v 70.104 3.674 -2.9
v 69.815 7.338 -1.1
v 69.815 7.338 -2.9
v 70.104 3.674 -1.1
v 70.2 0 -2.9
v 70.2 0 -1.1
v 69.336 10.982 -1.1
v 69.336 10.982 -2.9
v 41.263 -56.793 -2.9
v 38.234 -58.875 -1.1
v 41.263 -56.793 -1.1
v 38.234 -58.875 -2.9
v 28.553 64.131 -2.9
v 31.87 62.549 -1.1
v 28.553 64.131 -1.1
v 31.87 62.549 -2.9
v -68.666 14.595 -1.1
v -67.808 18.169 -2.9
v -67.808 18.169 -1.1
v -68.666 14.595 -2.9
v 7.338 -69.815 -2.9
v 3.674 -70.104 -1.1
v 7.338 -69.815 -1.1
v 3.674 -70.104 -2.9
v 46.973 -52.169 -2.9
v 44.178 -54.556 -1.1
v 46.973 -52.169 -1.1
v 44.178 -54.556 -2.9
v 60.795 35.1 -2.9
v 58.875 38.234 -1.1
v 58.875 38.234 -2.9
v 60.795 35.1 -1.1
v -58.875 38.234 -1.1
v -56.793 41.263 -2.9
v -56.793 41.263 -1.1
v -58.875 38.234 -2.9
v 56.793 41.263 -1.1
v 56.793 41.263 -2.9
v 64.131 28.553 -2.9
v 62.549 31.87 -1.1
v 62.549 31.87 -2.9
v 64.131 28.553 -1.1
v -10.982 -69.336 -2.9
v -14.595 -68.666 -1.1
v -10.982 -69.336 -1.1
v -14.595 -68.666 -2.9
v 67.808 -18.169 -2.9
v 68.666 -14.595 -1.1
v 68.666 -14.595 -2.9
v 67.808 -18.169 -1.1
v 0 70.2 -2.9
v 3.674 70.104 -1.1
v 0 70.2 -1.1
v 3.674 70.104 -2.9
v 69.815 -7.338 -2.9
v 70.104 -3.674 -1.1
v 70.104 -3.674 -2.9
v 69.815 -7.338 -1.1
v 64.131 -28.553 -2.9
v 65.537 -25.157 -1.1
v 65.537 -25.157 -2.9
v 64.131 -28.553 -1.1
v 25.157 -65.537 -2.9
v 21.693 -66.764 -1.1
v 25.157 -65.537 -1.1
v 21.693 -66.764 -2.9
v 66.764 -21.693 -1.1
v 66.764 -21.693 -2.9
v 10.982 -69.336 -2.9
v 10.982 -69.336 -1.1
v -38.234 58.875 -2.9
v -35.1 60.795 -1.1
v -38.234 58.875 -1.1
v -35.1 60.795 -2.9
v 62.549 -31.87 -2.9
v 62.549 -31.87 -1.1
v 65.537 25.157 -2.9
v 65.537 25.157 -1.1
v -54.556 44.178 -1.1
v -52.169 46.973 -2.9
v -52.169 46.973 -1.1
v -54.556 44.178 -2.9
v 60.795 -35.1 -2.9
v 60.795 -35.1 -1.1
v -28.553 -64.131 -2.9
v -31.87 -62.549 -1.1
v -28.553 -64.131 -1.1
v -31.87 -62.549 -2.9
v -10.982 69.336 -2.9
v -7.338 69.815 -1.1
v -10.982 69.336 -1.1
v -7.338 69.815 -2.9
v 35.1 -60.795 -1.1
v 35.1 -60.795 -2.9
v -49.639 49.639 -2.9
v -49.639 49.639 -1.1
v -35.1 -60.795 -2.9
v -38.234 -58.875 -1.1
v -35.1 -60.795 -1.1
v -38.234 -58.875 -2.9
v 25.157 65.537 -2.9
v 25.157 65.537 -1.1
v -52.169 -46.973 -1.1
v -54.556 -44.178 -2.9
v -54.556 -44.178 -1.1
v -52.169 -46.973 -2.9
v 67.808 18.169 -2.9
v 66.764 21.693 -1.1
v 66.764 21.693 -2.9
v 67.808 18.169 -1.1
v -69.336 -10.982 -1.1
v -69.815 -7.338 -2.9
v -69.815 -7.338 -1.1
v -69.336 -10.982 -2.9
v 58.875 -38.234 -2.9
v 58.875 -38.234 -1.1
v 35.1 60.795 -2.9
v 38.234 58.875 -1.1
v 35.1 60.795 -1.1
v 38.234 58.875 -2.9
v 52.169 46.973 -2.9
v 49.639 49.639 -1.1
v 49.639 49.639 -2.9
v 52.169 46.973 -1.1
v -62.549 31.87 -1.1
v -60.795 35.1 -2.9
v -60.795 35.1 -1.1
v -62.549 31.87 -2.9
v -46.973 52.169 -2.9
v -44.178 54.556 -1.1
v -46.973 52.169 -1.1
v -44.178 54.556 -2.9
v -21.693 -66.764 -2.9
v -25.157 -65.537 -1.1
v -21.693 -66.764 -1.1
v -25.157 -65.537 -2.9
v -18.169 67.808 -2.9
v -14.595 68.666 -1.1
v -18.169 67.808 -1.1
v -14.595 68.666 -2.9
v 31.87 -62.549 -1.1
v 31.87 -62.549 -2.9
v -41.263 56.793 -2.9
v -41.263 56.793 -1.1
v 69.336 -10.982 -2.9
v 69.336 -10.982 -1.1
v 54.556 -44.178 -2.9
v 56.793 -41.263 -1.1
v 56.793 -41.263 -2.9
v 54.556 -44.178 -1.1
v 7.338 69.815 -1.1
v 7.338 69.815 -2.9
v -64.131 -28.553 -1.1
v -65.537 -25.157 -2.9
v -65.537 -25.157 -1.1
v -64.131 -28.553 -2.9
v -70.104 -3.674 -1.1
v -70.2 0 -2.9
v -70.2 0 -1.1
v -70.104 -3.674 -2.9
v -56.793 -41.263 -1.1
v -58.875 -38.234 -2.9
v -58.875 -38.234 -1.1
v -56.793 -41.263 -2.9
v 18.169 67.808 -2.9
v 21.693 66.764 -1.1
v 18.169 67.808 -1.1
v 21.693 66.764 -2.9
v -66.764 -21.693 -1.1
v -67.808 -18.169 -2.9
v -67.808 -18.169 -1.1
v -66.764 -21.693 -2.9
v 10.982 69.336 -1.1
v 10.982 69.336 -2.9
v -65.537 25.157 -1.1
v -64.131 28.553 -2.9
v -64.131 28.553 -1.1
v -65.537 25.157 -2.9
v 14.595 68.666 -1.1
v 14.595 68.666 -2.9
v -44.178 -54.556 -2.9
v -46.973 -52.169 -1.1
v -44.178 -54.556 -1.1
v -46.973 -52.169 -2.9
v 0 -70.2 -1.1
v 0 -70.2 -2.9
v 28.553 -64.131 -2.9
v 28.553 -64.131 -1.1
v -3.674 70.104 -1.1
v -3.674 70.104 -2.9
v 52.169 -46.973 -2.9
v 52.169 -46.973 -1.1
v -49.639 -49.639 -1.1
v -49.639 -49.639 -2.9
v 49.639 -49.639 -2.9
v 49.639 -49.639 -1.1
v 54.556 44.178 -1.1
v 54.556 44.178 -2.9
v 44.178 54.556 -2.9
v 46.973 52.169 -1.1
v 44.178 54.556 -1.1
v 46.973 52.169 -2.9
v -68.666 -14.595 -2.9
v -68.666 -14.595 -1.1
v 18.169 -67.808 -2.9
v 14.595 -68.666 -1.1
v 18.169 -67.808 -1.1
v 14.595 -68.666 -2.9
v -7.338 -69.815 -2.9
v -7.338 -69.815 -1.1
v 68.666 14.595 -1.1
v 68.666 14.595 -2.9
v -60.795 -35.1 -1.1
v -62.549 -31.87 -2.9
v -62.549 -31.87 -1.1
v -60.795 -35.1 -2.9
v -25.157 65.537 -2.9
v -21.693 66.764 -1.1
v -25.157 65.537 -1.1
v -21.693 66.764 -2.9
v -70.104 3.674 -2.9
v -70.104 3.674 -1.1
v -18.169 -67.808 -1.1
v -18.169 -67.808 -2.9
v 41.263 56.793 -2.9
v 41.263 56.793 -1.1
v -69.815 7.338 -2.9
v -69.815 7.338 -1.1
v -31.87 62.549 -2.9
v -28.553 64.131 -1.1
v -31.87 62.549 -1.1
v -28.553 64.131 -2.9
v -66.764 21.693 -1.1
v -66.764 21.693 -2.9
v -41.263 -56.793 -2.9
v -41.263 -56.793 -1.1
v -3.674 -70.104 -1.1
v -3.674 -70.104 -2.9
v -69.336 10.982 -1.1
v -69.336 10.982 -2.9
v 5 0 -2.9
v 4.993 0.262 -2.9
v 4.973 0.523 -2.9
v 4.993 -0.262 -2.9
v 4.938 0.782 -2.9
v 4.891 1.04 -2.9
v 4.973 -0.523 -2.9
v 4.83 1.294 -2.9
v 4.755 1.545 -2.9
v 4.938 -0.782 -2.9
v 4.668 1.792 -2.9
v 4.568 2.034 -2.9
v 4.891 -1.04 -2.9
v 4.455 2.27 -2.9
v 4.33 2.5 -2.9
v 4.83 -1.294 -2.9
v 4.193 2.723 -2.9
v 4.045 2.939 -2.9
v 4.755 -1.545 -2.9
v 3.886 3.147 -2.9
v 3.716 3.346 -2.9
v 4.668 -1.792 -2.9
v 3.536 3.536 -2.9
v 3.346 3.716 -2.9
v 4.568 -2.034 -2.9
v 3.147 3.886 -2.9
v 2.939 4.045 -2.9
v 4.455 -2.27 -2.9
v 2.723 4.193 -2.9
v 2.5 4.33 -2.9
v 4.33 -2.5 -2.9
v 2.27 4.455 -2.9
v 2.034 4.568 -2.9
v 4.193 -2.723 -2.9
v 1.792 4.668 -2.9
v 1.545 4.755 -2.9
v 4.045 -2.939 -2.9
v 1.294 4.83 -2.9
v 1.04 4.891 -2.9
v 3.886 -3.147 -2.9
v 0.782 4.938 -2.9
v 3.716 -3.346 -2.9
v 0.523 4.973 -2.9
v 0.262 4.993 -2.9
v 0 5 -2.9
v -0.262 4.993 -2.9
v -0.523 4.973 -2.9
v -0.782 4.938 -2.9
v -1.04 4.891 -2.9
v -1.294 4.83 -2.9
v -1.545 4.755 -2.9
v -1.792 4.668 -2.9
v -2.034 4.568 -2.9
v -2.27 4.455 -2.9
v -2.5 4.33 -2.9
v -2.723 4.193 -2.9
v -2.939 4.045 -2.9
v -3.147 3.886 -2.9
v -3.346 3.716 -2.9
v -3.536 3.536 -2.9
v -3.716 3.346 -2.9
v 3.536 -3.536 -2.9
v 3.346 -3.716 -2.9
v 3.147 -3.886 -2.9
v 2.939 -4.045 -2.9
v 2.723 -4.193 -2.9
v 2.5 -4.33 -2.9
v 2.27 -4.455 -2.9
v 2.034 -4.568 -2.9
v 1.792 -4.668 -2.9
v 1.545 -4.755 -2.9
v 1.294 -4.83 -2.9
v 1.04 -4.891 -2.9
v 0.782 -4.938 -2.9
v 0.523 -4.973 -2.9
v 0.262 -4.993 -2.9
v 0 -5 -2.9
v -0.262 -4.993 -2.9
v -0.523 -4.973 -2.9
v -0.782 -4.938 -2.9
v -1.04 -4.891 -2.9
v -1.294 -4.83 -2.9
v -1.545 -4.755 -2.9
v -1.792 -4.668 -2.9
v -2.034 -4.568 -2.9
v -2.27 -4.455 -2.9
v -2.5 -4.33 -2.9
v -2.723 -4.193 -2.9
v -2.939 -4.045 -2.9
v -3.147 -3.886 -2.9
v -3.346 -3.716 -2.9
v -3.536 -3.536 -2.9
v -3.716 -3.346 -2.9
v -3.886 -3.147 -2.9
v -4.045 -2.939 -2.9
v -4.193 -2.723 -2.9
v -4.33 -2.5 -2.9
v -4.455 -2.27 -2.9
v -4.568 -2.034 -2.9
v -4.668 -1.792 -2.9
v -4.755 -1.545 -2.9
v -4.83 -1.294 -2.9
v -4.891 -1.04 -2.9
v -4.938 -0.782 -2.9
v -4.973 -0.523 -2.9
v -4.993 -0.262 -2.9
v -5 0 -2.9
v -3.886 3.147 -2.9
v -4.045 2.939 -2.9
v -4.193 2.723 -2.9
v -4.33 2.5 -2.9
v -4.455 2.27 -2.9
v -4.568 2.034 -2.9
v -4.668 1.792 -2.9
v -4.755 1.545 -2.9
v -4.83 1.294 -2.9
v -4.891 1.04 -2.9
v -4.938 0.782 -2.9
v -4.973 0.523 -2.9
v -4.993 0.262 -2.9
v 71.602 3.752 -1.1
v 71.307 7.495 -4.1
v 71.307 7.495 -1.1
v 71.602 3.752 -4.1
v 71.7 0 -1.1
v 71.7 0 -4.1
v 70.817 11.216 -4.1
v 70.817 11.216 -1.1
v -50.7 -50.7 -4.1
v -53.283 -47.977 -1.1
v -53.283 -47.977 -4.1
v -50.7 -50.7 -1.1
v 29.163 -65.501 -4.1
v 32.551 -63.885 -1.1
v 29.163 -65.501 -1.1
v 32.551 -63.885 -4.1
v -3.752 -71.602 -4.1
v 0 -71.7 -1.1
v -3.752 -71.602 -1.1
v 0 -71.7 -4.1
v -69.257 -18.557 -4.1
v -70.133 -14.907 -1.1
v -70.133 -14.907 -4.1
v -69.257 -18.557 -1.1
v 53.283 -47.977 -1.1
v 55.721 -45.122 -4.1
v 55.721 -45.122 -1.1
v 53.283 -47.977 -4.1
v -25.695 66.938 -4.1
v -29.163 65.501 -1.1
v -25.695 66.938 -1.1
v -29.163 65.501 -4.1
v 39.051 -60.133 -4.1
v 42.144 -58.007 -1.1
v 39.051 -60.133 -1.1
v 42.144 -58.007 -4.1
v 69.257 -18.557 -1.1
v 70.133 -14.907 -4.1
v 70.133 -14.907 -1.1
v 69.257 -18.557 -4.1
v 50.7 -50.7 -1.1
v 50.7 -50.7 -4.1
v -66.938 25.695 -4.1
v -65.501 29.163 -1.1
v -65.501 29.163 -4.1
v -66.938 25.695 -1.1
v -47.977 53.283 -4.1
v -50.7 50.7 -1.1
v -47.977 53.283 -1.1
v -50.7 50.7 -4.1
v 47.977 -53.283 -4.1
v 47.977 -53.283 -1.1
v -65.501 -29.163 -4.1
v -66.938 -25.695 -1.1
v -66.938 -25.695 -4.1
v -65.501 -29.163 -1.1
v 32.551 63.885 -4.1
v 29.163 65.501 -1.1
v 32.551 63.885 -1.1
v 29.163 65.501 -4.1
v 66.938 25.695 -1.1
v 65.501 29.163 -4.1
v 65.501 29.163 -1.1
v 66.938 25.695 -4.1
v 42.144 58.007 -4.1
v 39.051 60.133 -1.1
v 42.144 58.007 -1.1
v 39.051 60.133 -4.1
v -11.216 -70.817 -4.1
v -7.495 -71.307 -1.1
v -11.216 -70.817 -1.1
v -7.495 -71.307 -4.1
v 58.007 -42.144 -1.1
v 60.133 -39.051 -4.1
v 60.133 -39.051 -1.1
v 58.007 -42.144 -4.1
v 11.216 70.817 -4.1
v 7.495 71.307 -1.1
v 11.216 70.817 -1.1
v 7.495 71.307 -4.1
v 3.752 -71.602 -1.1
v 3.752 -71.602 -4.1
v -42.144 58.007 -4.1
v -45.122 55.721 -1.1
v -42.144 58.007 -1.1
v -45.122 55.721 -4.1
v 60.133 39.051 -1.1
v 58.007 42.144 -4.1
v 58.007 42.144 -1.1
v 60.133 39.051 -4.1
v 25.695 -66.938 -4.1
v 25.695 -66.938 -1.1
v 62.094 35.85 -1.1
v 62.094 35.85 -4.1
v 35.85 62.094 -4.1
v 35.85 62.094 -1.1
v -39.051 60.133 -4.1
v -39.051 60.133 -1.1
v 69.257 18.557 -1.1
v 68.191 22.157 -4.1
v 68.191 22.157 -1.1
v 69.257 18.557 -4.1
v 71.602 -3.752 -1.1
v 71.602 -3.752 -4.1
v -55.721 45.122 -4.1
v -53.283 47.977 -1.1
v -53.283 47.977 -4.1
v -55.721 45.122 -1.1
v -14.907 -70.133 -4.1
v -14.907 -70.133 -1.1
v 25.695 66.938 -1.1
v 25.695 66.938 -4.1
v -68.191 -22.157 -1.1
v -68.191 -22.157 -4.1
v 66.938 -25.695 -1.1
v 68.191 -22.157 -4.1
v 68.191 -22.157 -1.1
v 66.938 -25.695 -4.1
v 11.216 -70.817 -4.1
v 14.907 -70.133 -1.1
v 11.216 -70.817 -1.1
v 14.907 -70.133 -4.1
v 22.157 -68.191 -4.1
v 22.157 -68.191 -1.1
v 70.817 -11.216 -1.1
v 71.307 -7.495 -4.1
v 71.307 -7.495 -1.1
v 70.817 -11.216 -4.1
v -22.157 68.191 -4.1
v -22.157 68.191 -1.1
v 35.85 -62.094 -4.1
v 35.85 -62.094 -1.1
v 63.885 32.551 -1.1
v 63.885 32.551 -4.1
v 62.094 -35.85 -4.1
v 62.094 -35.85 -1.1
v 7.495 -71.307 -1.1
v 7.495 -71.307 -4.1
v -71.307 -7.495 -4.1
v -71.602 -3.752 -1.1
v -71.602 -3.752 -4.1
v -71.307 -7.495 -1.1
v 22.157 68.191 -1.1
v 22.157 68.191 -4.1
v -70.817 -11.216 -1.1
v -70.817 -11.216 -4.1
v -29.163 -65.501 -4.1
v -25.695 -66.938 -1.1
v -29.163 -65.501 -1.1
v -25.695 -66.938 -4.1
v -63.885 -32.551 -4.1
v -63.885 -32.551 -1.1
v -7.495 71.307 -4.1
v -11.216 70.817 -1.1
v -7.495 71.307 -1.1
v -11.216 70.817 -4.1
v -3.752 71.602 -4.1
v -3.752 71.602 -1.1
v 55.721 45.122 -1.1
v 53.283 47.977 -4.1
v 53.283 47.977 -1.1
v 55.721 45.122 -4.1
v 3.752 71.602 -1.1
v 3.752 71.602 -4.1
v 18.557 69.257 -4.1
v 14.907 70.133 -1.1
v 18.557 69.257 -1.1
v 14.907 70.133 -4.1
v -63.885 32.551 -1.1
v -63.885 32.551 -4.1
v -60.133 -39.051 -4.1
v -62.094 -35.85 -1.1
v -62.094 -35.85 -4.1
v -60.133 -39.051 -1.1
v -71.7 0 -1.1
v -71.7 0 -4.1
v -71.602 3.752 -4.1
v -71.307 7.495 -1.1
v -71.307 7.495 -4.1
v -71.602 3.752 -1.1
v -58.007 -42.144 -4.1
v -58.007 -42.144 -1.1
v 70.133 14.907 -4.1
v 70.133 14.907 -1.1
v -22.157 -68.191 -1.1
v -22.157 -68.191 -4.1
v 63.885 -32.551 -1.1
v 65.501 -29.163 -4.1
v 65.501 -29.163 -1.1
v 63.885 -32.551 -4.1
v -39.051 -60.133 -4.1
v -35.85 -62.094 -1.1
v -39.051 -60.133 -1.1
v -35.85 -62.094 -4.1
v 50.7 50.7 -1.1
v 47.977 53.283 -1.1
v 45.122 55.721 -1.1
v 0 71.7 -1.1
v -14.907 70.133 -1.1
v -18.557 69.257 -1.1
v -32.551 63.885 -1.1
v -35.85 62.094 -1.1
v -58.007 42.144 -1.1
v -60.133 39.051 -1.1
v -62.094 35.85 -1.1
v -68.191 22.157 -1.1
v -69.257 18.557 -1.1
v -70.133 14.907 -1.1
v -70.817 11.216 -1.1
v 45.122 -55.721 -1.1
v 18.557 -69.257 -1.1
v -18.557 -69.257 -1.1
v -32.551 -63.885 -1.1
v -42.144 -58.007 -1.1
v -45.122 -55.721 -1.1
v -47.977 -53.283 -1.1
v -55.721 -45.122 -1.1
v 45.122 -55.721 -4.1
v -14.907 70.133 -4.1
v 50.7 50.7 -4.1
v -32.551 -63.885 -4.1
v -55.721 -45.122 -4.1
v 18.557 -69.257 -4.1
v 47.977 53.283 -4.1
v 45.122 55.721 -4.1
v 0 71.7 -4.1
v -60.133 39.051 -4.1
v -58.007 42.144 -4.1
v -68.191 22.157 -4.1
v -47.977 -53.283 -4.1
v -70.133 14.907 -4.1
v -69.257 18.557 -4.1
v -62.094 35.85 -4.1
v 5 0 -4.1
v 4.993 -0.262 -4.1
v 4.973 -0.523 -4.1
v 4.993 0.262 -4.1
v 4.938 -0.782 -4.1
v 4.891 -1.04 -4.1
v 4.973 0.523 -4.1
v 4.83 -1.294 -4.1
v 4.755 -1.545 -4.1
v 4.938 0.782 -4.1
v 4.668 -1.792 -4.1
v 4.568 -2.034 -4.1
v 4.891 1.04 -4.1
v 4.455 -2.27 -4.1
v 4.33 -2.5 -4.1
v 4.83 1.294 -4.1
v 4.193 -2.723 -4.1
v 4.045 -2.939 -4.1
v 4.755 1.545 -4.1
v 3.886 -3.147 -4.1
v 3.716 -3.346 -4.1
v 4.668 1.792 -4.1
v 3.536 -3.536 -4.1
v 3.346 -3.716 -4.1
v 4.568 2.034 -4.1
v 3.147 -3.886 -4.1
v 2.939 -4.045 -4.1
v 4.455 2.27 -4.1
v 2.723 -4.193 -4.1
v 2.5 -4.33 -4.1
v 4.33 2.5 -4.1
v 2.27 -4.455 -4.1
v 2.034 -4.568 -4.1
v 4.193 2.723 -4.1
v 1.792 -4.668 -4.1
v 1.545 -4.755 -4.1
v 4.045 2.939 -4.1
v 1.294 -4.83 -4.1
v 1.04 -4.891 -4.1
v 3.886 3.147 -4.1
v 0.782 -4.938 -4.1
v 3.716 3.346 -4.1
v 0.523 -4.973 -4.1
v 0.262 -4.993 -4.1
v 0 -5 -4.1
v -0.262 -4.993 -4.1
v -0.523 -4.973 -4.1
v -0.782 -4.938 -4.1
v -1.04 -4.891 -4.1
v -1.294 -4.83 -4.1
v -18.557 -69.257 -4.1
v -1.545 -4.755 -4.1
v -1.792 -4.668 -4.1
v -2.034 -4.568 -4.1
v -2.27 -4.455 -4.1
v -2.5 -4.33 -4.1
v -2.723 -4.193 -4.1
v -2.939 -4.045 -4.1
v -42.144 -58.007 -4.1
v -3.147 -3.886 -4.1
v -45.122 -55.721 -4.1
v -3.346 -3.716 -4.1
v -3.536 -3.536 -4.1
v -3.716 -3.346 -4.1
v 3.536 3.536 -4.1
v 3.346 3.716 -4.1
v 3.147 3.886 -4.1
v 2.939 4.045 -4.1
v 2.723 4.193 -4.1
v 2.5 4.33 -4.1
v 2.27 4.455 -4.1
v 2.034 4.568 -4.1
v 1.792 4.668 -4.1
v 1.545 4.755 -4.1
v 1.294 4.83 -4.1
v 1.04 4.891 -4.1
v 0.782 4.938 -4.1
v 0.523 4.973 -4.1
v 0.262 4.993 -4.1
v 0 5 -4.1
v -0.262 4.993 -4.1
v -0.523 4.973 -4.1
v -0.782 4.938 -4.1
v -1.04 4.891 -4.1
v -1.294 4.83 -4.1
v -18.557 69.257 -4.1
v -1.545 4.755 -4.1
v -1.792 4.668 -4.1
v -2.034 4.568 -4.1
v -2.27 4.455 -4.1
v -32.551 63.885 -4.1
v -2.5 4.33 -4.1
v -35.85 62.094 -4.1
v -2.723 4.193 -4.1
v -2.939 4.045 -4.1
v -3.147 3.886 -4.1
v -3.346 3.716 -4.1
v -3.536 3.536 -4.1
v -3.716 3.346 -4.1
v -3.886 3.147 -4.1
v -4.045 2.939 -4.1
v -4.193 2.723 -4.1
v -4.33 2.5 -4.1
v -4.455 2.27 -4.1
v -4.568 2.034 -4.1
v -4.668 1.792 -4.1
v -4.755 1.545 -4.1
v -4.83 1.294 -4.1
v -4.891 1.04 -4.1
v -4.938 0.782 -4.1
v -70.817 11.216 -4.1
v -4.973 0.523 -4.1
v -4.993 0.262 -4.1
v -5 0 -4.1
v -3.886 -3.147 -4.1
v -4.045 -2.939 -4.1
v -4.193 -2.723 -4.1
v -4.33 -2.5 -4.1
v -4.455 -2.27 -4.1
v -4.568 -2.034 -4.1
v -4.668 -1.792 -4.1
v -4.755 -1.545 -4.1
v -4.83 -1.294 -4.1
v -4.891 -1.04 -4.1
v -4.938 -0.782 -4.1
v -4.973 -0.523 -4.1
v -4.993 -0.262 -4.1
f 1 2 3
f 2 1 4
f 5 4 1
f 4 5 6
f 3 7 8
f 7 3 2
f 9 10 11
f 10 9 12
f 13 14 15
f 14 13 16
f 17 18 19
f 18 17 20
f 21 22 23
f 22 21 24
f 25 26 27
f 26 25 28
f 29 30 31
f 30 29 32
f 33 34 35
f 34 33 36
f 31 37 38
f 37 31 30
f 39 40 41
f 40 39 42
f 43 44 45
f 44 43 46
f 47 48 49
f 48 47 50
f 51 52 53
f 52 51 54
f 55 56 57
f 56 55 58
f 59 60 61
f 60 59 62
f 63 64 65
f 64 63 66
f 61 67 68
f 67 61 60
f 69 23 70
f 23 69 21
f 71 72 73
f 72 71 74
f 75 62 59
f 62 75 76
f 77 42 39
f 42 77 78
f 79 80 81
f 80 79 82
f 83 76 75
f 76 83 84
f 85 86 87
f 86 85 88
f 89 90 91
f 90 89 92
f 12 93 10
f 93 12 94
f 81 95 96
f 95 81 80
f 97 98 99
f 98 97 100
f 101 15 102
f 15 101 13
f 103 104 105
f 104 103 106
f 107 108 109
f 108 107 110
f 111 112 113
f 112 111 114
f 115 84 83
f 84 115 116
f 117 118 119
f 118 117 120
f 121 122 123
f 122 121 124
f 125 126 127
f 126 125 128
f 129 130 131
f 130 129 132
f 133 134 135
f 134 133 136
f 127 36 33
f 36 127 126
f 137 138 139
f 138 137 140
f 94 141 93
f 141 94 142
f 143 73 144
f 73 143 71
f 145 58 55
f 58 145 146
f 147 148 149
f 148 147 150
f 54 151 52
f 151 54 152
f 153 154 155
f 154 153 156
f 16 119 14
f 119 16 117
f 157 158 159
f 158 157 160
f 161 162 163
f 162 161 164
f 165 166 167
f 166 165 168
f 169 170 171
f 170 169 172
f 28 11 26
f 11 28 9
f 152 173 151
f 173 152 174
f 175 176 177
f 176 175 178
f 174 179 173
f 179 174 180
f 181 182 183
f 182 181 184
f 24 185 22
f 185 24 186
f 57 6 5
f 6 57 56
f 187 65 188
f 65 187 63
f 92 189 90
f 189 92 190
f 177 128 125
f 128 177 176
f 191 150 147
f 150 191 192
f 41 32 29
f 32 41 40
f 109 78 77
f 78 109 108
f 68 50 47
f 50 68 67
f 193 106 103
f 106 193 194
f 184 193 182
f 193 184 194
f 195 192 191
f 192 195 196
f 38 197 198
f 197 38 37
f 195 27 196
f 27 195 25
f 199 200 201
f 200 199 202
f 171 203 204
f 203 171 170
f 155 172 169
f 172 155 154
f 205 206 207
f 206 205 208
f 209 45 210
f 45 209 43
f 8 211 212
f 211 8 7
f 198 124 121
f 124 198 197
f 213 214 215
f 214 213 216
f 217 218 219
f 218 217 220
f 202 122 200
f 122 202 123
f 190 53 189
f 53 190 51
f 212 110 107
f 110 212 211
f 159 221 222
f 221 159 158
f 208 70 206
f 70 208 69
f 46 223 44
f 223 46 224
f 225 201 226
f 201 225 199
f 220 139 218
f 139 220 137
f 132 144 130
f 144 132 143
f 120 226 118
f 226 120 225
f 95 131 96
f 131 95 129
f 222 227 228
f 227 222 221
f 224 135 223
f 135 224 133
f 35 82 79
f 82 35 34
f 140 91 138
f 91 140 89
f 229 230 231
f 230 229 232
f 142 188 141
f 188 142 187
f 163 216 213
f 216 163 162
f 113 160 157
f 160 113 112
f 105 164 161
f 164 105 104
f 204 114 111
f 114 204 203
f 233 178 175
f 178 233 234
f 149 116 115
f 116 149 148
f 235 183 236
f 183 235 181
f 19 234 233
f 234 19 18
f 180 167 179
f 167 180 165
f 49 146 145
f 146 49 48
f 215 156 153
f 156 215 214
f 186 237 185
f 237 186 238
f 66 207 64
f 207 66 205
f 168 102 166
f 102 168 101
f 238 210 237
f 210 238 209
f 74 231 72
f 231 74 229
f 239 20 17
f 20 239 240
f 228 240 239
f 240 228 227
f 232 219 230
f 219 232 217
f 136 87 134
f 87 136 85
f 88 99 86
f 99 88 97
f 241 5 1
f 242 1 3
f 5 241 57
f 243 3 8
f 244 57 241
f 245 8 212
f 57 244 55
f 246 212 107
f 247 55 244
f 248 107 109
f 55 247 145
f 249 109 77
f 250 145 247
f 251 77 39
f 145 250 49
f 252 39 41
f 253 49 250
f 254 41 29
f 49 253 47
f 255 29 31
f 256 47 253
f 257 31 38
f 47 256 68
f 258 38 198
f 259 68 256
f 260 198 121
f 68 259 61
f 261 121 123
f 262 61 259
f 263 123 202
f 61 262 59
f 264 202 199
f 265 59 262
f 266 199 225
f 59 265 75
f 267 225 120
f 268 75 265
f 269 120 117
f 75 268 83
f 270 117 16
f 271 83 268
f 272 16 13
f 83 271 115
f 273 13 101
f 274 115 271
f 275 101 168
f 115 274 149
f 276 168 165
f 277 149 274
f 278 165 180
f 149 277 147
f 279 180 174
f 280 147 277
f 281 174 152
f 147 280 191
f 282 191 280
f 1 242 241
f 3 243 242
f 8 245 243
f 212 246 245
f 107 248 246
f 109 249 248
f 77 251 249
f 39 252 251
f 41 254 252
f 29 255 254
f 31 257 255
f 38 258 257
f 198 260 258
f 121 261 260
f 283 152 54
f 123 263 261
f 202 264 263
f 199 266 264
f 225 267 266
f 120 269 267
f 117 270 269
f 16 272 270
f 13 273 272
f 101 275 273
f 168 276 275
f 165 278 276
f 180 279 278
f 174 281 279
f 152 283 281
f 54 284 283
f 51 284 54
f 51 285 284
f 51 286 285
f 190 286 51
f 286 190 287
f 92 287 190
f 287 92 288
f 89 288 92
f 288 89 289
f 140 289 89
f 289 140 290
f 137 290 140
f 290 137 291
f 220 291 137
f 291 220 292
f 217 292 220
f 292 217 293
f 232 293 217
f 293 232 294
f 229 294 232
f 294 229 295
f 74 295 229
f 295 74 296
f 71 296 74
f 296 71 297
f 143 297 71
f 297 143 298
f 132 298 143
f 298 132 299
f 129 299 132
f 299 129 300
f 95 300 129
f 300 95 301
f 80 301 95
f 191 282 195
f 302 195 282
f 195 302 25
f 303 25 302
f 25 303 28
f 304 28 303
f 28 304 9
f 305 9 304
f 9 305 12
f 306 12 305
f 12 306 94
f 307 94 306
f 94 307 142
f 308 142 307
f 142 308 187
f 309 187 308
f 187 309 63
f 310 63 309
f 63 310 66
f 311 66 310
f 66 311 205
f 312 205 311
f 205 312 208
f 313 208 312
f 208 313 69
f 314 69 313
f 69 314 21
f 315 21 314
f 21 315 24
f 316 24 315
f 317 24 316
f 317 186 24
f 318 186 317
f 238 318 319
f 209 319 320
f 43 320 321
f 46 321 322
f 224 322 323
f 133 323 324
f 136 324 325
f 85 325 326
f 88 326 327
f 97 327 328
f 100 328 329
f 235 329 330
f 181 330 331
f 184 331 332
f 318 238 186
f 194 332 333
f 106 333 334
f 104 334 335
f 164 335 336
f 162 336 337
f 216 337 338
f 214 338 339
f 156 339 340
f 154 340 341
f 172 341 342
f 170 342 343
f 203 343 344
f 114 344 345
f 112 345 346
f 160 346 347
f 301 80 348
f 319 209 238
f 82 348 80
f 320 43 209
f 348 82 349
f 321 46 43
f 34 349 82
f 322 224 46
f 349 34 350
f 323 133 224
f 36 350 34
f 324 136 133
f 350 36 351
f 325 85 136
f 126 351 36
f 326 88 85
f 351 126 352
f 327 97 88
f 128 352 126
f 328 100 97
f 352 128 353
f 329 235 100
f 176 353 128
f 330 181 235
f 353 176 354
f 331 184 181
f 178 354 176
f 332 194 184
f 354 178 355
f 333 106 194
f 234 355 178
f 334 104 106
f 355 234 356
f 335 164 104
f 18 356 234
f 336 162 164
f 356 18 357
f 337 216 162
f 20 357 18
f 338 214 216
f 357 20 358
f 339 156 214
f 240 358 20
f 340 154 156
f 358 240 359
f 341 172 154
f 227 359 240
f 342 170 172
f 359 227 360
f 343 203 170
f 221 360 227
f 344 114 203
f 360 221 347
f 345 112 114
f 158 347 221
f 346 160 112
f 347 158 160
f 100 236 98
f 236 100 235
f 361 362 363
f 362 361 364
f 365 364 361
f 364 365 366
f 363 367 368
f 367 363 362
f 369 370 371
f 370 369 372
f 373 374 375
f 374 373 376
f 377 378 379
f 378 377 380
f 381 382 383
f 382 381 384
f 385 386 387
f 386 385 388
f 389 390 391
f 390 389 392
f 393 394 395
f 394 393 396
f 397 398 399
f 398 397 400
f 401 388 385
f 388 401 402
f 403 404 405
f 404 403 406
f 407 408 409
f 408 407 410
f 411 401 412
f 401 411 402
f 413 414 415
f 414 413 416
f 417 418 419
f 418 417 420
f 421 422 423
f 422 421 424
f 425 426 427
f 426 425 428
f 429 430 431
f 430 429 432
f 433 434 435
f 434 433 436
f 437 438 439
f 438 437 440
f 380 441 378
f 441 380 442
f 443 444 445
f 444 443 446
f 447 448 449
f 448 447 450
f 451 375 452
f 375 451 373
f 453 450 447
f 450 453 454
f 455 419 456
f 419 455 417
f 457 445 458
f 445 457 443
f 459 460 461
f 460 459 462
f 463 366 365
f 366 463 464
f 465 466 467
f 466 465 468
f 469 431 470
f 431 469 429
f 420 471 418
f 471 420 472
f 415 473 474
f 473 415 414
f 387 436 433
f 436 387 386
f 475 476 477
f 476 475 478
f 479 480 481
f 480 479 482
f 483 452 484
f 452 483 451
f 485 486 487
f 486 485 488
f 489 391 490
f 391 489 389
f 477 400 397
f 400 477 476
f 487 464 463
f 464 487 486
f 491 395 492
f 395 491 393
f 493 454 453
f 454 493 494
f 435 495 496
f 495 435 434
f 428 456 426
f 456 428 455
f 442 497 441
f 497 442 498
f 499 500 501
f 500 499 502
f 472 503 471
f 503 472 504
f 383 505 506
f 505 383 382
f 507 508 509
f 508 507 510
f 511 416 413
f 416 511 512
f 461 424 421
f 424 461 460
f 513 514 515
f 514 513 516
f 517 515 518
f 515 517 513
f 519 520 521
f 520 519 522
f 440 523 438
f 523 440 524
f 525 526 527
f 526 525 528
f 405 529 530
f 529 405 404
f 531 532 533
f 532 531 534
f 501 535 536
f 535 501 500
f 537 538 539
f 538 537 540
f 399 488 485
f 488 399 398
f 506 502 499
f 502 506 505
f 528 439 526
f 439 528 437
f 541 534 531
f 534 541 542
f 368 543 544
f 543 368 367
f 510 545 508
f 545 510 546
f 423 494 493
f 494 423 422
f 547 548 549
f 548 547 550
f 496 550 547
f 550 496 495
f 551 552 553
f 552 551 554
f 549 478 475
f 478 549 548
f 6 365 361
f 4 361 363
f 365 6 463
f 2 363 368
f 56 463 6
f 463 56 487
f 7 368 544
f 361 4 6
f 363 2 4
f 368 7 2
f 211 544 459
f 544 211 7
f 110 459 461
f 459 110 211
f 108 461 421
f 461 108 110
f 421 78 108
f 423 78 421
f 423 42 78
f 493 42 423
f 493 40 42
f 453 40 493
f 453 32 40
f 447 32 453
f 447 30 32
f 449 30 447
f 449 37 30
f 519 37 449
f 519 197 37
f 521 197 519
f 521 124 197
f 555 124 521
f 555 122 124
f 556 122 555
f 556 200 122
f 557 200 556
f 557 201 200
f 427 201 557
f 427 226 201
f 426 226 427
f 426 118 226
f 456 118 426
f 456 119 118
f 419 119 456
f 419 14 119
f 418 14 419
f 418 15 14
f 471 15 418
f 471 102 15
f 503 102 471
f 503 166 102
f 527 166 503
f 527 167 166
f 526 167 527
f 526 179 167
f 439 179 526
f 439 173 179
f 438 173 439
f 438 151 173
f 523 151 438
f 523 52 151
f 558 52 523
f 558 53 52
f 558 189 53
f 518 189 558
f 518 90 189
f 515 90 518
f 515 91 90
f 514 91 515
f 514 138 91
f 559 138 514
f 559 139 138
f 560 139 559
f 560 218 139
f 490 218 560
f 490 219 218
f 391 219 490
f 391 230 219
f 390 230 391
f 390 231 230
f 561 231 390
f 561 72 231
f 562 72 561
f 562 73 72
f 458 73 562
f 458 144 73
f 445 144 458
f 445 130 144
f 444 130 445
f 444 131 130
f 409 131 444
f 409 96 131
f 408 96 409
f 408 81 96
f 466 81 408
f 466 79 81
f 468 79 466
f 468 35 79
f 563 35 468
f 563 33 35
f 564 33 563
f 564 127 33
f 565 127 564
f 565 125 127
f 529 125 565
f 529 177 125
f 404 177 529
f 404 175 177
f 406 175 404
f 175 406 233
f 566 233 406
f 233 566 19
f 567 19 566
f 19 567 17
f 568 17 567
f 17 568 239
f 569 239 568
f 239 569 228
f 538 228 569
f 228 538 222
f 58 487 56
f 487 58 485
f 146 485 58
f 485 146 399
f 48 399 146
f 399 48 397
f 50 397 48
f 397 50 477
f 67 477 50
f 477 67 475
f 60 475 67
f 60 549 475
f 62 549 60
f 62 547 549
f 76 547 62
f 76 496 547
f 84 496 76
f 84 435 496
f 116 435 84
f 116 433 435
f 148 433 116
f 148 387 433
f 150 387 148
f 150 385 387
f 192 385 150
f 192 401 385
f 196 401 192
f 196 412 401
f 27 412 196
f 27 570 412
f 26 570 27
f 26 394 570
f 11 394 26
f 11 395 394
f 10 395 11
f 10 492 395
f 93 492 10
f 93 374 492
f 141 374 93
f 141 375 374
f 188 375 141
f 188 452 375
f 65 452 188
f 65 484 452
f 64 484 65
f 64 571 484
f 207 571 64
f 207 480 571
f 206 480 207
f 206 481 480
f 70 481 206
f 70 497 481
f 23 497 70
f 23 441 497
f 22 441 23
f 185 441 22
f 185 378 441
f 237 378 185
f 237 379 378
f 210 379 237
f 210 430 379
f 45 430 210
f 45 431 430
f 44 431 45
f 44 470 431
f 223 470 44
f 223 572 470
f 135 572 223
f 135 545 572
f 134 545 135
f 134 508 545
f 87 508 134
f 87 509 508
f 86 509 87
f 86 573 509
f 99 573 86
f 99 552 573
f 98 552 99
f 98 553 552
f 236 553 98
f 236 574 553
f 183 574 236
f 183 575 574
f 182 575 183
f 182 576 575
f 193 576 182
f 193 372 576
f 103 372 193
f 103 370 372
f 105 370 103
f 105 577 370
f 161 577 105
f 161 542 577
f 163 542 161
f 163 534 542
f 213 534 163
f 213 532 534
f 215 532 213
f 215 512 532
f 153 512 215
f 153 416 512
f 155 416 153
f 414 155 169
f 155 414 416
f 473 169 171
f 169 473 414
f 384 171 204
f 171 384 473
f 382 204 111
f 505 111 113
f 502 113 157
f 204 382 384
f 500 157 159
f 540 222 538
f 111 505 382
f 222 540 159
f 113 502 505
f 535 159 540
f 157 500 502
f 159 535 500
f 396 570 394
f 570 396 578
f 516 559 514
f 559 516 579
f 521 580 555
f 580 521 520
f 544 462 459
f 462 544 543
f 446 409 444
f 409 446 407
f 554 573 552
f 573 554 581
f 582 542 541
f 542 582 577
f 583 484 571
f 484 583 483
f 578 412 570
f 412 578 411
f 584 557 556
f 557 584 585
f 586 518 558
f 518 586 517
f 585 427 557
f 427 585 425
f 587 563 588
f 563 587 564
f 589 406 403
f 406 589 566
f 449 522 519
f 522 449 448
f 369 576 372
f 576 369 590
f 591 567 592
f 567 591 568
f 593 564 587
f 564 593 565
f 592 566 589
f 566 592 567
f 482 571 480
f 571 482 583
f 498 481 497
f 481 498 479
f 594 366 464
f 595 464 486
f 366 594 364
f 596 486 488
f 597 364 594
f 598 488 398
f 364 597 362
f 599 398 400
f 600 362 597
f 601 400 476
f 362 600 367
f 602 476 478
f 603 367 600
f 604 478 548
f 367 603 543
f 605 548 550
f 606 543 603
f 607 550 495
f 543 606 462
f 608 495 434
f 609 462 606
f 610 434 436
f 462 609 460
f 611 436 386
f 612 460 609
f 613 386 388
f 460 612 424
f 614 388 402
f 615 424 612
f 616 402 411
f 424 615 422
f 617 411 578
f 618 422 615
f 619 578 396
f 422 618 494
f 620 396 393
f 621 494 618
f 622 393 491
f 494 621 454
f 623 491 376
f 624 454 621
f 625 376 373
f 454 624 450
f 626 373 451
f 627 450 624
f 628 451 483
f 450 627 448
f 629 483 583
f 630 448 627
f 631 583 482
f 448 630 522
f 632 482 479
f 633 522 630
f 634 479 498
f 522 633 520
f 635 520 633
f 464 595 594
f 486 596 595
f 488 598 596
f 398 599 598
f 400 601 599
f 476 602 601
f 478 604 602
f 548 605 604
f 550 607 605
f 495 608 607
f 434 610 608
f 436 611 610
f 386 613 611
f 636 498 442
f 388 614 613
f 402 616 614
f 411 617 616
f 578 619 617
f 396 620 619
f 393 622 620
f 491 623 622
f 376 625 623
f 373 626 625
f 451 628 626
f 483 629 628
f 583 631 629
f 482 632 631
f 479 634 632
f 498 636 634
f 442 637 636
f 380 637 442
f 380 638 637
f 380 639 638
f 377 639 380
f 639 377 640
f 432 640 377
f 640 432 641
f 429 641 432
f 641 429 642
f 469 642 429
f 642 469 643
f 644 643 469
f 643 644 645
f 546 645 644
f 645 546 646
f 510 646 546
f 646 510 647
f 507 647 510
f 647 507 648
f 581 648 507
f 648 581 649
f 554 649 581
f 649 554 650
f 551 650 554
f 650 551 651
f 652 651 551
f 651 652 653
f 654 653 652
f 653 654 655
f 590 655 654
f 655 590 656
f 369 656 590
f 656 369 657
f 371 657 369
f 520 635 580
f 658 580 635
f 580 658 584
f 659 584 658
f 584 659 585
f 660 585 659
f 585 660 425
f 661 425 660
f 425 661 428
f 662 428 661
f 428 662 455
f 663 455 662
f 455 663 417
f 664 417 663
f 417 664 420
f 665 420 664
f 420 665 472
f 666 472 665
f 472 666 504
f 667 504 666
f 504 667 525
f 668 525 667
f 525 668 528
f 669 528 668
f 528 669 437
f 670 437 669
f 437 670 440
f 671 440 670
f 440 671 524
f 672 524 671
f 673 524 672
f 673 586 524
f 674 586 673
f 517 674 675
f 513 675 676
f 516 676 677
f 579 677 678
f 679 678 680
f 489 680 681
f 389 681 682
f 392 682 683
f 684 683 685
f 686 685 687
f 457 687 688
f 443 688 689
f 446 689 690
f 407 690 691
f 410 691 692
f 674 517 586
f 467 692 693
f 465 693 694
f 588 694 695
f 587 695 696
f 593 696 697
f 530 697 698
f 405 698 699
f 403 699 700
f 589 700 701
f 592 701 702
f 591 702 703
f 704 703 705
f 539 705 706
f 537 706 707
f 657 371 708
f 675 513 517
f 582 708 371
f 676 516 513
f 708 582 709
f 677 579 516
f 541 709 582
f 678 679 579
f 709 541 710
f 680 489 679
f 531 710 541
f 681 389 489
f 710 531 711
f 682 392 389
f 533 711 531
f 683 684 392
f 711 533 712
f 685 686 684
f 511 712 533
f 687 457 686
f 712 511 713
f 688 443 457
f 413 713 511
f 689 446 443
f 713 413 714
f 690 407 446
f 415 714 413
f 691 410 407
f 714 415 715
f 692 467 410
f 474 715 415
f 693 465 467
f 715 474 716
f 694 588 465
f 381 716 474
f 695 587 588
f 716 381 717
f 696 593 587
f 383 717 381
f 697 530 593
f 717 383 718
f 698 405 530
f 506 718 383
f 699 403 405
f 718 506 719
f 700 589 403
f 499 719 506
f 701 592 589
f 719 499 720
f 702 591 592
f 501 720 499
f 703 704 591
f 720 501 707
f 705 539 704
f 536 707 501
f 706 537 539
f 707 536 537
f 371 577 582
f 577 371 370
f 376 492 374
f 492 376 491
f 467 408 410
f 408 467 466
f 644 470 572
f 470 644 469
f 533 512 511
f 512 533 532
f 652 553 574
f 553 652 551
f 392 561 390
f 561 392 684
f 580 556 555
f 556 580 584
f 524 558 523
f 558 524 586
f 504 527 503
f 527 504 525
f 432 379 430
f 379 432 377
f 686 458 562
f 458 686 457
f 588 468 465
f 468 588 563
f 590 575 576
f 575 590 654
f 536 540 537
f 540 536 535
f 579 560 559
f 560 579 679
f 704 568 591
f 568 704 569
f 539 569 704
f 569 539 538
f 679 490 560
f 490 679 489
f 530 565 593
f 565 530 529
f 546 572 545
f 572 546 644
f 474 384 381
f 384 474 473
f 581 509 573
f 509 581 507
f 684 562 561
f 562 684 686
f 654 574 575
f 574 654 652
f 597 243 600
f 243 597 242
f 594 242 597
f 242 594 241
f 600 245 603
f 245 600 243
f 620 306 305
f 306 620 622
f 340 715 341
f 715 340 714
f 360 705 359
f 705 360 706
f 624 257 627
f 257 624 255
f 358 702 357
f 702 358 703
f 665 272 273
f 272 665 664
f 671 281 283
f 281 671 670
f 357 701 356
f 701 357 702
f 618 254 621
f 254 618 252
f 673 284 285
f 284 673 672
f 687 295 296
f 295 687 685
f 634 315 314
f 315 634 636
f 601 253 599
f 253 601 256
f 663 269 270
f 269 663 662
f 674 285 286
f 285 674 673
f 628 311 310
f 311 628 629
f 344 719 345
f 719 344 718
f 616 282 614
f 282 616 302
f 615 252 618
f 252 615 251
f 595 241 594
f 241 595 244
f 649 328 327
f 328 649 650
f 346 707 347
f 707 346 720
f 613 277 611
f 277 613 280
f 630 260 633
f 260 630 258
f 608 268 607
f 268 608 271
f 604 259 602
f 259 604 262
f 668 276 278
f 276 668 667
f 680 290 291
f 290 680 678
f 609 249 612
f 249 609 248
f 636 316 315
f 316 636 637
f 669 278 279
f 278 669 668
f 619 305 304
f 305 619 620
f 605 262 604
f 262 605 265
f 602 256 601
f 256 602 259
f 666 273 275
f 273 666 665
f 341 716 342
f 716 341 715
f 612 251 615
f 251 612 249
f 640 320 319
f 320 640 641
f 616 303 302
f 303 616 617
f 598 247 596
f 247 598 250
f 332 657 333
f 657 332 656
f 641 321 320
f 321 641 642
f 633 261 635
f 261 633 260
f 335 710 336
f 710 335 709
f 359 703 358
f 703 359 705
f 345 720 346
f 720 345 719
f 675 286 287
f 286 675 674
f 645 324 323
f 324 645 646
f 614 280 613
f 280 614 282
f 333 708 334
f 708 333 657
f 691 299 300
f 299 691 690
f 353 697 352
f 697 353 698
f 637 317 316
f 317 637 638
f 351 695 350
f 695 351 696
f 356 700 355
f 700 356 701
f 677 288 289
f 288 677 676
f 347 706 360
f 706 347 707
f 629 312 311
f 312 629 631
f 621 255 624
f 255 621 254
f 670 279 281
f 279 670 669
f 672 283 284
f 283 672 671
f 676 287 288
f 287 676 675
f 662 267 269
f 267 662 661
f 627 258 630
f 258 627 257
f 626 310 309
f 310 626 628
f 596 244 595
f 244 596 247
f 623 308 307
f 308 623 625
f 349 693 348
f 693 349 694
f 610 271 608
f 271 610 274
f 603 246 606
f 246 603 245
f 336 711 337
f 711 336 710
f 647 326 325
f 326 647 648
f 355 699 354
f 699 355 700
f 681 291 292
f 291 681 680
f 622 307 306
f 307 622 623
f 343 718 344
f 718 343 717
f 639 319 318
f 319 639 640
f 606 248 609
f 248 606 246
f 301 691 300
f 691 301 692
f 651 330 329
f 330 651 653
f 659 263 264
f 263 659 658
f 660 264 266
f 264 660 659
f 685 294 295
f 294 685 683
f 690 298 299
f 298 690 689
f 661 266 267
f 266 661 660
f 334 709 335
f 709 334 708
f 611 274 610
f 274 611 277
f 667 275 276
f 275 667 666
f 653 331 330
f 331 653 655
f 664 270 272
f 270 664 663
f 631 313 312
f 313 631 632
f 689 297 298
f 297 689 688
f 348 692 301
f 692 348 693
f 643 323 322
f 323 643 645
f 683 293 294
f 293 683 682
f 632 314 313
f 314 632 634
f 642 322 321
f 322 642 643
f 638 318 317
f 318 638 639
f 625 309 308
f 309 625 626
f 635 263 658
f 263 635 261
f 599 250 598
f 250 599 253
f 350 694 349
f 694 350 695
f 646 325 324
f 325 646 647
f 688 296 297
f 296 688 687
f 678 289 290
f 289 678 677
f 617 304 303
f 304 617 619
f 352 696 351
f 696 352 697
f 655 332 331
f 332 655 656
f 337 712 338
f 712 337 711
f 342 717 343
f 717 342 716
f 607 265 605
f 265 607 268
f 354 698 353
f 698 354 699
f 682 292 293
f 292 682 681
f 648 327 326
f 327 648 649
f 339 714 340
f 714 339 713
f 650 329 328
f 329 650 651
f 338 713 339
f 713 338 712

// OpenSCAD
//
// gear motor for
// https://www.thingiverse.com/thing:1385312
//

m_dia = 49.8;
m_hgt = 23.0;
m1_dist = 56.7;
m2_dist = 54.8;
m2_offs = 7.0;
mt_hgt = 0.8;
mt_dia = 4.4;
a_ofs = 13.0;
r1_dia = 12.0;
r2_dia = 10.4;
r1_hgt = 2.0;
r2_hgt = 1.0;
a_dia = 7.0; // axle diameter
a_len = 15.0;
a2_len = 12.0; // axle flat section
a2_wid = 5.0;

adapter_dia = 8.0;
adapter_hgt = 10.5;
adapter_tol = 0.15;

base_dia = 140.0;
base_hgt = 2.4;
base_tol = 0.2;
base_wall = 1.5;

conn_dia = 10.0; // 10.9

d = 0.01;

// adapter for existing spiral
module adapter() {
    translate([0,0,m_hgt+r1_hgt+r2_hgt]) {
        difference () {
            color("red") translate([0,0,a_len-adapter_hgt]) cylinder(d=adapter_dia-2*adapter_tol, h=adapter_hgt, $fn=60);
            difference () {
                translate([0,0,-d]) cylinder(d=a_dia+2*adapter_tol, h=d+a_len+d, $fn=60);
                translate([-a_dia/2,-a_dia/2+a2_wid+adapter_tol,a_len-a2_len]) cube([a_dia, a_dia, a2_len+d]);
            }
        }
    }
}

module base() {
    difference () {
        union () { // add
            translate([0,0,-base_wall-base_tol-base_hgt]) 
              color("brown") cylinder(d=base_dia+2*base_tol+2*base_wall, h=3, $fn=120);
            // hole for connector
            /*
            translate([0,base_dia/2,m_hgt/2]) rotate([-90,0,0]) cylinder(d=conn_dia+2*base_wall, h=1.5*base_wall, $fn=30);
            */
        }
        union () { // sub
            
            translate([0,0,-base_tol-base_hgt]) {
                cylinder(d=base_dia-2*base_wall, h=base_hgt+40/*base_tol+base_hgt+(m_hgt+r1_hgt+r2_hgt+a_len-adapter_hgt)+d*/, $fn=120);
            }
            
            translate([0,0,-31-base_hgt+(m_hgt+r1_hgt+r2_hgt+a_len-adapter_hgt)]) {
                cylinder(d=base_dia+2*base_tol, h=base_hgt+100*d, $fn=120);
            }
            // hole for connector
            /*
            translate([0,base_dia/2-2*base_wall,m_hgt/2]) rotate([-90,0,0]) cylinder(d=conn_dia, 
            h=2*base_wall+1.5*base_wall+d, $fn=30);
            */
        }
    }

/*
    translate([0,-a_ofs,-base_tol-base_hgt]) {
        for (dx = [-1,1]) translate([dx*m1_dist/2,0,0]) {
            difference () {
                scale([1,1.9,1]) cylinder(d=6.0, h=base_tol+base_hgt+m_hgt-mt_hgt, $fn=60);
                cylinder(d=2.6, h=base_tol+base_hgt+m_hgt-mt_hgt+d, $fn=60);
            }
        }
        for (dx = [-1,1]) translate([dx*m2_dist/2,-m2_offs,0]) {
            difference () {
                scale([1,1.9,1]) cylinder(d=6.0, h=base_tol+base_hgt+m_hgt-mt_hgt, $fn=60);
                cylinder(d=2.6, h=base_tol+base_hgt+m_hgt-mt_hgt+d, $fn=60);
            }
        }
    }
 */   
}

module motor() {
    translate([0,0,m_hgt]) {
        cylinder(d=r1_dia, h=r1_hgt, $fn=60);
        cylinder(d=r2_dia, h=r1_hgt+r2_hgt, $fn=60);
        difference () {
            cylinder(d=a_dia, h=r1_hgt+r2_hgt+a_len, $fn=60);
            translate([-a_dia/2,-a_dia/2+a2_wid,r1_hgt+r2_hgt+a_len-a2_len]) cube([a_dia, a_dia, a2_len+d]);
        }
    }
    translate([0,-a_ofs,0]) {
            cylinder(d=m_dia, h=m_hgt, $fn=120);
        for (dx = [-1,1]) translate([dx*m1_dist/2,0,m_hgt-mt_hgt]) {
            difference () {
                cylinder(d=10.0, h=mt_hgt, $fn=60);
                translate([0,0,-d])cylinder(d=mt_dia, h=mt_hgt+2*d, $fn=60);
            }
        }
        for (dx = [-1,1]) translate([dx*m2_dist/2,-m2_offs,m_hgt-mt_hgt]) {
            difference () {
                cylinder(d=10.0, h=mt_hgt, $fn=60);
                translate([0,0,-d])cylinder(d=mt_dia, h=mt_hgt+2*d, $fn=60);
            }
        }
    }
}

//adapter();
difference() {
base();
//color("red") translate([-9.25,4.8,-2.5]) import("MotorMount.stl");
color("purple") translate([0,0,-4.5]) cylinder(h=3,r1=5,r2=5,$fn=120);
}
//motor();
